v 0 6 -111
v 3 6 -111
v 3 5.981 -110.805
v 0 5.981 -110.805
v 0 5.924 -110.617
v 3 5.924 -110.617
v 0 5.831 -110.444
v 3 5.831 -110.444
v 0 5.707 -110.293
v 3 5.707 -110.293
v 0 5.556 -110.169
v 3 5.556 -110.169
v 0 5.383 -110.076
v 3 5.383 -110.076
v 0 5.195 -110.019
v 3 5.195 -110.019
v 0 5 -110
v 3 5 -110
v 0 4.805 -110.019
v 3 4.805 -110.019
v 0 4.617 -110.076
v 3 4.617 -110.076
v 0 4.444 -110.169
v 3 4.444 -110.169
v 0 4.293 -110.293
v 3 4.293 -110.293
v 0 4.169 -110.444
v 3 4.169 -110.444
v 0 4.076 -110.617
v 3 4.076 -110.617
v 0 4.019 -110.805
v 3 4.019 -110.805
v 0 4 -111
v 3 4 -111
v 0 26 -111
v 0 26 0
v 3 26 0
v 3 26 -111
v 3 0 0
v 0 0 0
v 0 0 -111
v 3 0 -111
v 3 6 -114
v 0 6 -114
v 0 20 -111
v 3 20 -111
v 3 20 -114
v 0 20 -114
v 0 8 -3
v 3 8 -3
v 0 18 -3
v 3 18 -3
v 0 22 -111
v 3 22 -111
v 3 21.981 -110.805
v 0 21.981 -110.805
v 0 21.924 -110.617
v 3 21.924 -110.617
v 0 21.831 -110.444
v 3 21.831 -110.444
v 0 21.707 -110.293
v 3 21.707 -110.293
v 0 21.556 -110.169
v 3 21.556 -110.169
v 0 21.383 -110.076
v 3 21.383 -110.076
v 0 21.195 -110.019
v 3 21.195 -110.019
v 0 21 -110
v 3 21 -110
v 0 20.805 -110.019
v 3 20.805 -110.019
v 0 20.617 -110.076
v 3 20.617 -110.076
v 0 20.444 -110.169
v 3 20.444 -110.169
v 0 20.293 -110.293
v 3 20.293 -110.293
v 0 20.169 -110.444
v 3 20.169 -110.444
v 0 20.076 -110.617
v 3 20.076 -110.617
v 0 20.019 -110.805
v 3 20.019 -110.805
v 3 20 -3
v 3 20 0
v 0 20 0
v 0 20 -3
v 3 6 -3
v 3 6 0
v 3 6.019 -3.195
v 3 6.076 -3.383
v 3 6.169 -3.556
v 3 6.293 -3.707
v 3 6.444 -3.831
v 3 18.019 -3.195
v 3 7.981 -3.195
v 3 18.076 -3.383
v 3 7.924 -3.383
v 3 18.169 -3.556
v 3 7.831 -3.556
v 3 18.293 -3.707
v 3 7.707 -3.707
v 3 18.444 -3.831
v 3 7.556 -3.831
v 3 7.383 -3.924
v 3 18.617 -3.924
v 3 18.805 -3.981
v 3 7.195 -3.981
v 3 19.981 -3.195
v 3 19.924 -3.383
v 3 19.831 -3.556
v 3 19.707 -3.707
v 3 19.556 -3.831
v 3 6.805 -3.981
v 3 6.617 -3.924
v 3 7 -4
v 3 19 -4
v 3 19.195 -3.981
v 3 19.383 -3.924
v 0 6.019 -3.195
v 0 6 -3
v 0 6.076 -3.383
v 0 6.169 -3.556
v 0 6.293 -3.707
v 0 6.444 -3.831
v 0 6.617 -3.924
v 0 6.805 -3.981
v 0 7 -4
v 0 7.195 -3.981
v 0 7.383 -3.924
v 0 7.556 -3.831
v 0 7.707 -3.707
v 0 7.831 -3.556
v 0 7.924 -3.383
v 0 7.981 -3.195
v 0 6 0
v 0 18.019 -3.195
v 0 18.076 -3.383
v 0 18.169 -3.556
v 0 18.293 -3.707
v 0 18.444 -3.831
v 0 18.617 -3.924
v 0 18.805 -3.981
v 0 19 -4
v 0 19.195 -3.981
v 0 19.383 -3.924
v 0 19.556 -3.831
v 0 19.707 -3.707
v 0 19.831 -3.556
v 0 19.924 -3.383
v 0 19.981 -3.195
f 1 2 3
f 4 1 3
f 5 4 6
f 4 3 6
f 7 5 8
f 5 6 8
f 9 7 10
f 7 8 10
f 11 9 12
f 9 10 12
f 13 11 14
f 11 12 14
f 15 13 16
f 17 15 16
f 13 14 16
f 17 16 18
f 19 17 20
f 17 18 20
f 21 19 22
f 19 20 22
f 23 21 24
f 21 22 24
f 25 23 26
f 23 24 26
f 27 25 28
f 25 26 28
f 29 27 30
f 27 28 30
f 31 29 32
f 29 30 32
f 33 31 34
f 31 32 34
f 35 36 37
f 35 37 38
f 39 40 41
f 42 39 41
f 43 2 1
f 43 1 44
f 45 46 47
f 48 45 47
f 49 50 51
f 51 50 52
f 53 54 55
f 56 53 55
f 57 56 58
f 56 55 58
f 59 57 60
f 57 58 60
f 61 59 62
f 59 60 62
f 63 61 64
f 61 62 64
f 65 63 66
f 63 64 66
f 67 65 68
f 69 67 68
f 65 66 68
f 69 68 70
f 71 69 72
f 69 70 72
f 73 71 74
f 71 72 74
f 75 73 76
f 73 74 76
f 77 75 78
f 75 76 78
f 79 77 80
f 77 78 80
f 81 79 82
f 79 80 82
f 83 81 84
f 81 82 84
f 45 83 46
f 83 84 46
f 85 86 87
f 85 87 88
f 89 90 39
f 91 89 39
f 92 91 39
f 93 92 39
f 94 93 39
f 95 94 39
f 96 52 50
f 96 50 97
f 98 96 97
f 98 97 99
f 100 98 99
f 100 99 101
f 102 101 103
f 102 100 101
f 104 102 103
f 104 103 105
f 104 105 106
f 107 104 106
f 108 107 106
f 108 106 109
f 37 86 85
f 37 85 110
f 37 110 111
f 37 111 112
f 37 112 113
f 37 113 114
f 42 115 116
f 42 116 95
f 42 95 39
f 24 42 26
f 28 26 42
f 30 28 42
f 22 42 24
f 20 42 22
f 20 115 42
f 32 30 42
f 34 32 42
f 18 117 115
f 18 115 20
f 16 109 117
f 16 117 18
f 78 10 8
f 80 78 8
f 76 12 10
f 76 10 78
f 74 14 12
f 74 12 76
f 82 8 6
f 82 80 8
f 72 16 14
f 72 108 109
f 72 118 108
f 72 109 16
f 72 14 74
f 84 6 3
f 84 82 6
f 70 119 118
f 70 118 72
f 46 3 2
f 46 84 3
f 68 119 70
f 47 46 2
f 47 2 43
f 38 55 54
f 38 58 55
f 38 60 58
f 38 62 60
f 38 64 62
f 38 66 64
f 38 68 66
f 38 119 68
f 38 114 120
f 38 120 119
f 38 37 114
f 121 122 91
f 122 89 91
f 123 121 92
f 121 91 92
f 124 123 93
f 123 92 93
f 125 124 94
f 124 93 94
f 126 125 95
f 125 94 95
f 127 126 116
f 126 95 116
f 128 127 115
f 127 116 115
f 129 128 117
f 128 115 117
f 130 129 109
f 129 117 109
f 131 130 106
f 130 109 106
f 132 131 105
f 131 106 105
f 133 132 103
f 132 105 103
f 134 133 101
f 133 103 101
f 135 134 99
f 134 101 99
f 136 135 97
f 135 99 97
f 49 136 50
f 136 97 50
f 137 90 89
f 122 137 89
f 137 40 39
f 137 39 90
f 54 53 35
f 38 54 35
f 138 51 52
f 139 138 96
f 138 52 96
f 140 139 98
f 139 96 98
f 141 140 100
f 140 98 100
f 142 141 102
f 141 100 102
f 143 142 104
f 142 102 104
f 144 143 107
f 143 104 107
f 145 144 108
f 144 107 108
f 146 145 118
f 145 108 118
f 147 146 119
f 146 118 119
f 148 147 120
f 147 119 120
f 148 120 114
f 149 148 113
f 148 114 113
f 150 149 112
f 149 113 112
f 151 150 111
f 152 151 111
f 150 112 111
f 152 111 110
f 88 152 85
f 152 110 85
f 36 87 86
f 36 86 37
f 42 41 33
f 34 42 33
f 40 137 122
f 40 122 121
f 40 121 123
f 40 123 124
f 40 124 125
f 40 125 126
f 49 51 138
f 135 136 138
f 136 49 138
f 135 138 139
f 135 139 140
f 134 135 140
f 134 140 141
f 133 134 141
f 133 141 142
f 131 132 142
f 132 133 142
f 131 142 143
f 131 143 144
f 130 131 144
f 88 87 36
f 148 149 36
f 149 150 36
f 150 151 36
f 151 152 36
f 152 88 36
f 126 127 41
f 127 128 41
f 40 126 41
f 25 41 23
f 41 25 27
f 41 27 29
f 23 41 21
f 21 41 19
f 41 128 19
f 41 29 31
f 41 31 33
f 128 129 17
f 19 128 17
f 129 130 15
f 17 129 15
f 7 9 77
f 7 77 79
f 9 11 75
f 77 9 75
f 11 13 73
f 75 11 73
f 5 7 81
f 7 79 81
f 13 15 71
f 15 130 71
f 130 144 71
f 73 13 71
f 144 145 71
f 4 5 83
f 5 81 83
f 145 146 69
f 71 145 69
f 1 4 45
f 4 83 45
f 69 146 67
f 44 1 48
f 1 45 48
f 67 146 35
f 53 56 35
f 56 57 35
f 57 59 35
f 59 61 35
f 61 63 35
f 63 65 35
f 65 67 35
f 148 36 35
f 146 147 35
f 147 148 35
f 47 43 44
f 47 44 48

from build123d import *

# Parameters (mm, degrees)
SKETCH_1_W          = 111
SKETCH_1_H          = 26
EXTRUDE_1_DEPTH     = 3
SKETCH_2_W          = 3
SKETCH_2_H          = 14
EXTRUDE_2_DEPTH     = 3
SKETCH_3_W          = 3
SKETCH_3_H          = 14
CUT_EXTRUDE_1_DEPTH = 5
SKETCH_4_R          = 1
CUT_EXTRUDE_2_DEPTH = 10


with BuildPart() as part:
    # 스케치1 → 보스-돌출1 (new body)
    with BuildSketch(Plane(origin=(0, 0, 0), x_dir=(0, 0, -1), z_dir=(1, 0, 0))):
        with Locations((55.5, 13)):
            Rectangle(SKETCH_1_W, SKETCH_1_H)
    extrude(amount=EXTRUDE_1_DEPTH)

    # 스케치2 → 보스-돌출2 (add)
    with BuildSketch(Plane(origin=(3, 0, 0), x_dir=(0, 0, -1), z_dir=(1, 0, 0))):
        with Locations((112.5, 13)):
            Rectangle(SKETCH_2_W, SKETCH_2_H)
    extrude(amount=-EXTRUDE_2_DEPTH)

    # 스케치3 → 컷-돌출1 (cut)
    with BuildSketch(Plane(origin=(3, 0, 0), x_dir=(0, 0, -1), z_dir=(1, 0, 0))):
        with Locations((1.5, 13)):
            Rectangle(SKETCH_3_W, SKETCH_3_H)
    extrude(amount=-CUT_EXTRUDE_1_DEPTH, mode=Mode.SUBTRACT)

    # 스케치4 → 컷-돌출2 (cut)
    with BuildSketch(Plane(origin=(3, 0, 0), x_dir=(0, 0, -1), z_dir=(1, 0, 0))):
        with Locations((111, 21)):
            Circle(SKETCH_4_R)
        with Locations((111, 5)):
            Circle(SKETCH_4_R)
        with Locations((3, 19)):
            Circle(SKETCH_4_R)
        with Locations((3, 7)):
            Circle(SKETCH_4_R)
    extrude(amount=-CUT_EXTRUDE_2_DEPTH, mode=Mode.SUBTRACT)


solid = part.part
